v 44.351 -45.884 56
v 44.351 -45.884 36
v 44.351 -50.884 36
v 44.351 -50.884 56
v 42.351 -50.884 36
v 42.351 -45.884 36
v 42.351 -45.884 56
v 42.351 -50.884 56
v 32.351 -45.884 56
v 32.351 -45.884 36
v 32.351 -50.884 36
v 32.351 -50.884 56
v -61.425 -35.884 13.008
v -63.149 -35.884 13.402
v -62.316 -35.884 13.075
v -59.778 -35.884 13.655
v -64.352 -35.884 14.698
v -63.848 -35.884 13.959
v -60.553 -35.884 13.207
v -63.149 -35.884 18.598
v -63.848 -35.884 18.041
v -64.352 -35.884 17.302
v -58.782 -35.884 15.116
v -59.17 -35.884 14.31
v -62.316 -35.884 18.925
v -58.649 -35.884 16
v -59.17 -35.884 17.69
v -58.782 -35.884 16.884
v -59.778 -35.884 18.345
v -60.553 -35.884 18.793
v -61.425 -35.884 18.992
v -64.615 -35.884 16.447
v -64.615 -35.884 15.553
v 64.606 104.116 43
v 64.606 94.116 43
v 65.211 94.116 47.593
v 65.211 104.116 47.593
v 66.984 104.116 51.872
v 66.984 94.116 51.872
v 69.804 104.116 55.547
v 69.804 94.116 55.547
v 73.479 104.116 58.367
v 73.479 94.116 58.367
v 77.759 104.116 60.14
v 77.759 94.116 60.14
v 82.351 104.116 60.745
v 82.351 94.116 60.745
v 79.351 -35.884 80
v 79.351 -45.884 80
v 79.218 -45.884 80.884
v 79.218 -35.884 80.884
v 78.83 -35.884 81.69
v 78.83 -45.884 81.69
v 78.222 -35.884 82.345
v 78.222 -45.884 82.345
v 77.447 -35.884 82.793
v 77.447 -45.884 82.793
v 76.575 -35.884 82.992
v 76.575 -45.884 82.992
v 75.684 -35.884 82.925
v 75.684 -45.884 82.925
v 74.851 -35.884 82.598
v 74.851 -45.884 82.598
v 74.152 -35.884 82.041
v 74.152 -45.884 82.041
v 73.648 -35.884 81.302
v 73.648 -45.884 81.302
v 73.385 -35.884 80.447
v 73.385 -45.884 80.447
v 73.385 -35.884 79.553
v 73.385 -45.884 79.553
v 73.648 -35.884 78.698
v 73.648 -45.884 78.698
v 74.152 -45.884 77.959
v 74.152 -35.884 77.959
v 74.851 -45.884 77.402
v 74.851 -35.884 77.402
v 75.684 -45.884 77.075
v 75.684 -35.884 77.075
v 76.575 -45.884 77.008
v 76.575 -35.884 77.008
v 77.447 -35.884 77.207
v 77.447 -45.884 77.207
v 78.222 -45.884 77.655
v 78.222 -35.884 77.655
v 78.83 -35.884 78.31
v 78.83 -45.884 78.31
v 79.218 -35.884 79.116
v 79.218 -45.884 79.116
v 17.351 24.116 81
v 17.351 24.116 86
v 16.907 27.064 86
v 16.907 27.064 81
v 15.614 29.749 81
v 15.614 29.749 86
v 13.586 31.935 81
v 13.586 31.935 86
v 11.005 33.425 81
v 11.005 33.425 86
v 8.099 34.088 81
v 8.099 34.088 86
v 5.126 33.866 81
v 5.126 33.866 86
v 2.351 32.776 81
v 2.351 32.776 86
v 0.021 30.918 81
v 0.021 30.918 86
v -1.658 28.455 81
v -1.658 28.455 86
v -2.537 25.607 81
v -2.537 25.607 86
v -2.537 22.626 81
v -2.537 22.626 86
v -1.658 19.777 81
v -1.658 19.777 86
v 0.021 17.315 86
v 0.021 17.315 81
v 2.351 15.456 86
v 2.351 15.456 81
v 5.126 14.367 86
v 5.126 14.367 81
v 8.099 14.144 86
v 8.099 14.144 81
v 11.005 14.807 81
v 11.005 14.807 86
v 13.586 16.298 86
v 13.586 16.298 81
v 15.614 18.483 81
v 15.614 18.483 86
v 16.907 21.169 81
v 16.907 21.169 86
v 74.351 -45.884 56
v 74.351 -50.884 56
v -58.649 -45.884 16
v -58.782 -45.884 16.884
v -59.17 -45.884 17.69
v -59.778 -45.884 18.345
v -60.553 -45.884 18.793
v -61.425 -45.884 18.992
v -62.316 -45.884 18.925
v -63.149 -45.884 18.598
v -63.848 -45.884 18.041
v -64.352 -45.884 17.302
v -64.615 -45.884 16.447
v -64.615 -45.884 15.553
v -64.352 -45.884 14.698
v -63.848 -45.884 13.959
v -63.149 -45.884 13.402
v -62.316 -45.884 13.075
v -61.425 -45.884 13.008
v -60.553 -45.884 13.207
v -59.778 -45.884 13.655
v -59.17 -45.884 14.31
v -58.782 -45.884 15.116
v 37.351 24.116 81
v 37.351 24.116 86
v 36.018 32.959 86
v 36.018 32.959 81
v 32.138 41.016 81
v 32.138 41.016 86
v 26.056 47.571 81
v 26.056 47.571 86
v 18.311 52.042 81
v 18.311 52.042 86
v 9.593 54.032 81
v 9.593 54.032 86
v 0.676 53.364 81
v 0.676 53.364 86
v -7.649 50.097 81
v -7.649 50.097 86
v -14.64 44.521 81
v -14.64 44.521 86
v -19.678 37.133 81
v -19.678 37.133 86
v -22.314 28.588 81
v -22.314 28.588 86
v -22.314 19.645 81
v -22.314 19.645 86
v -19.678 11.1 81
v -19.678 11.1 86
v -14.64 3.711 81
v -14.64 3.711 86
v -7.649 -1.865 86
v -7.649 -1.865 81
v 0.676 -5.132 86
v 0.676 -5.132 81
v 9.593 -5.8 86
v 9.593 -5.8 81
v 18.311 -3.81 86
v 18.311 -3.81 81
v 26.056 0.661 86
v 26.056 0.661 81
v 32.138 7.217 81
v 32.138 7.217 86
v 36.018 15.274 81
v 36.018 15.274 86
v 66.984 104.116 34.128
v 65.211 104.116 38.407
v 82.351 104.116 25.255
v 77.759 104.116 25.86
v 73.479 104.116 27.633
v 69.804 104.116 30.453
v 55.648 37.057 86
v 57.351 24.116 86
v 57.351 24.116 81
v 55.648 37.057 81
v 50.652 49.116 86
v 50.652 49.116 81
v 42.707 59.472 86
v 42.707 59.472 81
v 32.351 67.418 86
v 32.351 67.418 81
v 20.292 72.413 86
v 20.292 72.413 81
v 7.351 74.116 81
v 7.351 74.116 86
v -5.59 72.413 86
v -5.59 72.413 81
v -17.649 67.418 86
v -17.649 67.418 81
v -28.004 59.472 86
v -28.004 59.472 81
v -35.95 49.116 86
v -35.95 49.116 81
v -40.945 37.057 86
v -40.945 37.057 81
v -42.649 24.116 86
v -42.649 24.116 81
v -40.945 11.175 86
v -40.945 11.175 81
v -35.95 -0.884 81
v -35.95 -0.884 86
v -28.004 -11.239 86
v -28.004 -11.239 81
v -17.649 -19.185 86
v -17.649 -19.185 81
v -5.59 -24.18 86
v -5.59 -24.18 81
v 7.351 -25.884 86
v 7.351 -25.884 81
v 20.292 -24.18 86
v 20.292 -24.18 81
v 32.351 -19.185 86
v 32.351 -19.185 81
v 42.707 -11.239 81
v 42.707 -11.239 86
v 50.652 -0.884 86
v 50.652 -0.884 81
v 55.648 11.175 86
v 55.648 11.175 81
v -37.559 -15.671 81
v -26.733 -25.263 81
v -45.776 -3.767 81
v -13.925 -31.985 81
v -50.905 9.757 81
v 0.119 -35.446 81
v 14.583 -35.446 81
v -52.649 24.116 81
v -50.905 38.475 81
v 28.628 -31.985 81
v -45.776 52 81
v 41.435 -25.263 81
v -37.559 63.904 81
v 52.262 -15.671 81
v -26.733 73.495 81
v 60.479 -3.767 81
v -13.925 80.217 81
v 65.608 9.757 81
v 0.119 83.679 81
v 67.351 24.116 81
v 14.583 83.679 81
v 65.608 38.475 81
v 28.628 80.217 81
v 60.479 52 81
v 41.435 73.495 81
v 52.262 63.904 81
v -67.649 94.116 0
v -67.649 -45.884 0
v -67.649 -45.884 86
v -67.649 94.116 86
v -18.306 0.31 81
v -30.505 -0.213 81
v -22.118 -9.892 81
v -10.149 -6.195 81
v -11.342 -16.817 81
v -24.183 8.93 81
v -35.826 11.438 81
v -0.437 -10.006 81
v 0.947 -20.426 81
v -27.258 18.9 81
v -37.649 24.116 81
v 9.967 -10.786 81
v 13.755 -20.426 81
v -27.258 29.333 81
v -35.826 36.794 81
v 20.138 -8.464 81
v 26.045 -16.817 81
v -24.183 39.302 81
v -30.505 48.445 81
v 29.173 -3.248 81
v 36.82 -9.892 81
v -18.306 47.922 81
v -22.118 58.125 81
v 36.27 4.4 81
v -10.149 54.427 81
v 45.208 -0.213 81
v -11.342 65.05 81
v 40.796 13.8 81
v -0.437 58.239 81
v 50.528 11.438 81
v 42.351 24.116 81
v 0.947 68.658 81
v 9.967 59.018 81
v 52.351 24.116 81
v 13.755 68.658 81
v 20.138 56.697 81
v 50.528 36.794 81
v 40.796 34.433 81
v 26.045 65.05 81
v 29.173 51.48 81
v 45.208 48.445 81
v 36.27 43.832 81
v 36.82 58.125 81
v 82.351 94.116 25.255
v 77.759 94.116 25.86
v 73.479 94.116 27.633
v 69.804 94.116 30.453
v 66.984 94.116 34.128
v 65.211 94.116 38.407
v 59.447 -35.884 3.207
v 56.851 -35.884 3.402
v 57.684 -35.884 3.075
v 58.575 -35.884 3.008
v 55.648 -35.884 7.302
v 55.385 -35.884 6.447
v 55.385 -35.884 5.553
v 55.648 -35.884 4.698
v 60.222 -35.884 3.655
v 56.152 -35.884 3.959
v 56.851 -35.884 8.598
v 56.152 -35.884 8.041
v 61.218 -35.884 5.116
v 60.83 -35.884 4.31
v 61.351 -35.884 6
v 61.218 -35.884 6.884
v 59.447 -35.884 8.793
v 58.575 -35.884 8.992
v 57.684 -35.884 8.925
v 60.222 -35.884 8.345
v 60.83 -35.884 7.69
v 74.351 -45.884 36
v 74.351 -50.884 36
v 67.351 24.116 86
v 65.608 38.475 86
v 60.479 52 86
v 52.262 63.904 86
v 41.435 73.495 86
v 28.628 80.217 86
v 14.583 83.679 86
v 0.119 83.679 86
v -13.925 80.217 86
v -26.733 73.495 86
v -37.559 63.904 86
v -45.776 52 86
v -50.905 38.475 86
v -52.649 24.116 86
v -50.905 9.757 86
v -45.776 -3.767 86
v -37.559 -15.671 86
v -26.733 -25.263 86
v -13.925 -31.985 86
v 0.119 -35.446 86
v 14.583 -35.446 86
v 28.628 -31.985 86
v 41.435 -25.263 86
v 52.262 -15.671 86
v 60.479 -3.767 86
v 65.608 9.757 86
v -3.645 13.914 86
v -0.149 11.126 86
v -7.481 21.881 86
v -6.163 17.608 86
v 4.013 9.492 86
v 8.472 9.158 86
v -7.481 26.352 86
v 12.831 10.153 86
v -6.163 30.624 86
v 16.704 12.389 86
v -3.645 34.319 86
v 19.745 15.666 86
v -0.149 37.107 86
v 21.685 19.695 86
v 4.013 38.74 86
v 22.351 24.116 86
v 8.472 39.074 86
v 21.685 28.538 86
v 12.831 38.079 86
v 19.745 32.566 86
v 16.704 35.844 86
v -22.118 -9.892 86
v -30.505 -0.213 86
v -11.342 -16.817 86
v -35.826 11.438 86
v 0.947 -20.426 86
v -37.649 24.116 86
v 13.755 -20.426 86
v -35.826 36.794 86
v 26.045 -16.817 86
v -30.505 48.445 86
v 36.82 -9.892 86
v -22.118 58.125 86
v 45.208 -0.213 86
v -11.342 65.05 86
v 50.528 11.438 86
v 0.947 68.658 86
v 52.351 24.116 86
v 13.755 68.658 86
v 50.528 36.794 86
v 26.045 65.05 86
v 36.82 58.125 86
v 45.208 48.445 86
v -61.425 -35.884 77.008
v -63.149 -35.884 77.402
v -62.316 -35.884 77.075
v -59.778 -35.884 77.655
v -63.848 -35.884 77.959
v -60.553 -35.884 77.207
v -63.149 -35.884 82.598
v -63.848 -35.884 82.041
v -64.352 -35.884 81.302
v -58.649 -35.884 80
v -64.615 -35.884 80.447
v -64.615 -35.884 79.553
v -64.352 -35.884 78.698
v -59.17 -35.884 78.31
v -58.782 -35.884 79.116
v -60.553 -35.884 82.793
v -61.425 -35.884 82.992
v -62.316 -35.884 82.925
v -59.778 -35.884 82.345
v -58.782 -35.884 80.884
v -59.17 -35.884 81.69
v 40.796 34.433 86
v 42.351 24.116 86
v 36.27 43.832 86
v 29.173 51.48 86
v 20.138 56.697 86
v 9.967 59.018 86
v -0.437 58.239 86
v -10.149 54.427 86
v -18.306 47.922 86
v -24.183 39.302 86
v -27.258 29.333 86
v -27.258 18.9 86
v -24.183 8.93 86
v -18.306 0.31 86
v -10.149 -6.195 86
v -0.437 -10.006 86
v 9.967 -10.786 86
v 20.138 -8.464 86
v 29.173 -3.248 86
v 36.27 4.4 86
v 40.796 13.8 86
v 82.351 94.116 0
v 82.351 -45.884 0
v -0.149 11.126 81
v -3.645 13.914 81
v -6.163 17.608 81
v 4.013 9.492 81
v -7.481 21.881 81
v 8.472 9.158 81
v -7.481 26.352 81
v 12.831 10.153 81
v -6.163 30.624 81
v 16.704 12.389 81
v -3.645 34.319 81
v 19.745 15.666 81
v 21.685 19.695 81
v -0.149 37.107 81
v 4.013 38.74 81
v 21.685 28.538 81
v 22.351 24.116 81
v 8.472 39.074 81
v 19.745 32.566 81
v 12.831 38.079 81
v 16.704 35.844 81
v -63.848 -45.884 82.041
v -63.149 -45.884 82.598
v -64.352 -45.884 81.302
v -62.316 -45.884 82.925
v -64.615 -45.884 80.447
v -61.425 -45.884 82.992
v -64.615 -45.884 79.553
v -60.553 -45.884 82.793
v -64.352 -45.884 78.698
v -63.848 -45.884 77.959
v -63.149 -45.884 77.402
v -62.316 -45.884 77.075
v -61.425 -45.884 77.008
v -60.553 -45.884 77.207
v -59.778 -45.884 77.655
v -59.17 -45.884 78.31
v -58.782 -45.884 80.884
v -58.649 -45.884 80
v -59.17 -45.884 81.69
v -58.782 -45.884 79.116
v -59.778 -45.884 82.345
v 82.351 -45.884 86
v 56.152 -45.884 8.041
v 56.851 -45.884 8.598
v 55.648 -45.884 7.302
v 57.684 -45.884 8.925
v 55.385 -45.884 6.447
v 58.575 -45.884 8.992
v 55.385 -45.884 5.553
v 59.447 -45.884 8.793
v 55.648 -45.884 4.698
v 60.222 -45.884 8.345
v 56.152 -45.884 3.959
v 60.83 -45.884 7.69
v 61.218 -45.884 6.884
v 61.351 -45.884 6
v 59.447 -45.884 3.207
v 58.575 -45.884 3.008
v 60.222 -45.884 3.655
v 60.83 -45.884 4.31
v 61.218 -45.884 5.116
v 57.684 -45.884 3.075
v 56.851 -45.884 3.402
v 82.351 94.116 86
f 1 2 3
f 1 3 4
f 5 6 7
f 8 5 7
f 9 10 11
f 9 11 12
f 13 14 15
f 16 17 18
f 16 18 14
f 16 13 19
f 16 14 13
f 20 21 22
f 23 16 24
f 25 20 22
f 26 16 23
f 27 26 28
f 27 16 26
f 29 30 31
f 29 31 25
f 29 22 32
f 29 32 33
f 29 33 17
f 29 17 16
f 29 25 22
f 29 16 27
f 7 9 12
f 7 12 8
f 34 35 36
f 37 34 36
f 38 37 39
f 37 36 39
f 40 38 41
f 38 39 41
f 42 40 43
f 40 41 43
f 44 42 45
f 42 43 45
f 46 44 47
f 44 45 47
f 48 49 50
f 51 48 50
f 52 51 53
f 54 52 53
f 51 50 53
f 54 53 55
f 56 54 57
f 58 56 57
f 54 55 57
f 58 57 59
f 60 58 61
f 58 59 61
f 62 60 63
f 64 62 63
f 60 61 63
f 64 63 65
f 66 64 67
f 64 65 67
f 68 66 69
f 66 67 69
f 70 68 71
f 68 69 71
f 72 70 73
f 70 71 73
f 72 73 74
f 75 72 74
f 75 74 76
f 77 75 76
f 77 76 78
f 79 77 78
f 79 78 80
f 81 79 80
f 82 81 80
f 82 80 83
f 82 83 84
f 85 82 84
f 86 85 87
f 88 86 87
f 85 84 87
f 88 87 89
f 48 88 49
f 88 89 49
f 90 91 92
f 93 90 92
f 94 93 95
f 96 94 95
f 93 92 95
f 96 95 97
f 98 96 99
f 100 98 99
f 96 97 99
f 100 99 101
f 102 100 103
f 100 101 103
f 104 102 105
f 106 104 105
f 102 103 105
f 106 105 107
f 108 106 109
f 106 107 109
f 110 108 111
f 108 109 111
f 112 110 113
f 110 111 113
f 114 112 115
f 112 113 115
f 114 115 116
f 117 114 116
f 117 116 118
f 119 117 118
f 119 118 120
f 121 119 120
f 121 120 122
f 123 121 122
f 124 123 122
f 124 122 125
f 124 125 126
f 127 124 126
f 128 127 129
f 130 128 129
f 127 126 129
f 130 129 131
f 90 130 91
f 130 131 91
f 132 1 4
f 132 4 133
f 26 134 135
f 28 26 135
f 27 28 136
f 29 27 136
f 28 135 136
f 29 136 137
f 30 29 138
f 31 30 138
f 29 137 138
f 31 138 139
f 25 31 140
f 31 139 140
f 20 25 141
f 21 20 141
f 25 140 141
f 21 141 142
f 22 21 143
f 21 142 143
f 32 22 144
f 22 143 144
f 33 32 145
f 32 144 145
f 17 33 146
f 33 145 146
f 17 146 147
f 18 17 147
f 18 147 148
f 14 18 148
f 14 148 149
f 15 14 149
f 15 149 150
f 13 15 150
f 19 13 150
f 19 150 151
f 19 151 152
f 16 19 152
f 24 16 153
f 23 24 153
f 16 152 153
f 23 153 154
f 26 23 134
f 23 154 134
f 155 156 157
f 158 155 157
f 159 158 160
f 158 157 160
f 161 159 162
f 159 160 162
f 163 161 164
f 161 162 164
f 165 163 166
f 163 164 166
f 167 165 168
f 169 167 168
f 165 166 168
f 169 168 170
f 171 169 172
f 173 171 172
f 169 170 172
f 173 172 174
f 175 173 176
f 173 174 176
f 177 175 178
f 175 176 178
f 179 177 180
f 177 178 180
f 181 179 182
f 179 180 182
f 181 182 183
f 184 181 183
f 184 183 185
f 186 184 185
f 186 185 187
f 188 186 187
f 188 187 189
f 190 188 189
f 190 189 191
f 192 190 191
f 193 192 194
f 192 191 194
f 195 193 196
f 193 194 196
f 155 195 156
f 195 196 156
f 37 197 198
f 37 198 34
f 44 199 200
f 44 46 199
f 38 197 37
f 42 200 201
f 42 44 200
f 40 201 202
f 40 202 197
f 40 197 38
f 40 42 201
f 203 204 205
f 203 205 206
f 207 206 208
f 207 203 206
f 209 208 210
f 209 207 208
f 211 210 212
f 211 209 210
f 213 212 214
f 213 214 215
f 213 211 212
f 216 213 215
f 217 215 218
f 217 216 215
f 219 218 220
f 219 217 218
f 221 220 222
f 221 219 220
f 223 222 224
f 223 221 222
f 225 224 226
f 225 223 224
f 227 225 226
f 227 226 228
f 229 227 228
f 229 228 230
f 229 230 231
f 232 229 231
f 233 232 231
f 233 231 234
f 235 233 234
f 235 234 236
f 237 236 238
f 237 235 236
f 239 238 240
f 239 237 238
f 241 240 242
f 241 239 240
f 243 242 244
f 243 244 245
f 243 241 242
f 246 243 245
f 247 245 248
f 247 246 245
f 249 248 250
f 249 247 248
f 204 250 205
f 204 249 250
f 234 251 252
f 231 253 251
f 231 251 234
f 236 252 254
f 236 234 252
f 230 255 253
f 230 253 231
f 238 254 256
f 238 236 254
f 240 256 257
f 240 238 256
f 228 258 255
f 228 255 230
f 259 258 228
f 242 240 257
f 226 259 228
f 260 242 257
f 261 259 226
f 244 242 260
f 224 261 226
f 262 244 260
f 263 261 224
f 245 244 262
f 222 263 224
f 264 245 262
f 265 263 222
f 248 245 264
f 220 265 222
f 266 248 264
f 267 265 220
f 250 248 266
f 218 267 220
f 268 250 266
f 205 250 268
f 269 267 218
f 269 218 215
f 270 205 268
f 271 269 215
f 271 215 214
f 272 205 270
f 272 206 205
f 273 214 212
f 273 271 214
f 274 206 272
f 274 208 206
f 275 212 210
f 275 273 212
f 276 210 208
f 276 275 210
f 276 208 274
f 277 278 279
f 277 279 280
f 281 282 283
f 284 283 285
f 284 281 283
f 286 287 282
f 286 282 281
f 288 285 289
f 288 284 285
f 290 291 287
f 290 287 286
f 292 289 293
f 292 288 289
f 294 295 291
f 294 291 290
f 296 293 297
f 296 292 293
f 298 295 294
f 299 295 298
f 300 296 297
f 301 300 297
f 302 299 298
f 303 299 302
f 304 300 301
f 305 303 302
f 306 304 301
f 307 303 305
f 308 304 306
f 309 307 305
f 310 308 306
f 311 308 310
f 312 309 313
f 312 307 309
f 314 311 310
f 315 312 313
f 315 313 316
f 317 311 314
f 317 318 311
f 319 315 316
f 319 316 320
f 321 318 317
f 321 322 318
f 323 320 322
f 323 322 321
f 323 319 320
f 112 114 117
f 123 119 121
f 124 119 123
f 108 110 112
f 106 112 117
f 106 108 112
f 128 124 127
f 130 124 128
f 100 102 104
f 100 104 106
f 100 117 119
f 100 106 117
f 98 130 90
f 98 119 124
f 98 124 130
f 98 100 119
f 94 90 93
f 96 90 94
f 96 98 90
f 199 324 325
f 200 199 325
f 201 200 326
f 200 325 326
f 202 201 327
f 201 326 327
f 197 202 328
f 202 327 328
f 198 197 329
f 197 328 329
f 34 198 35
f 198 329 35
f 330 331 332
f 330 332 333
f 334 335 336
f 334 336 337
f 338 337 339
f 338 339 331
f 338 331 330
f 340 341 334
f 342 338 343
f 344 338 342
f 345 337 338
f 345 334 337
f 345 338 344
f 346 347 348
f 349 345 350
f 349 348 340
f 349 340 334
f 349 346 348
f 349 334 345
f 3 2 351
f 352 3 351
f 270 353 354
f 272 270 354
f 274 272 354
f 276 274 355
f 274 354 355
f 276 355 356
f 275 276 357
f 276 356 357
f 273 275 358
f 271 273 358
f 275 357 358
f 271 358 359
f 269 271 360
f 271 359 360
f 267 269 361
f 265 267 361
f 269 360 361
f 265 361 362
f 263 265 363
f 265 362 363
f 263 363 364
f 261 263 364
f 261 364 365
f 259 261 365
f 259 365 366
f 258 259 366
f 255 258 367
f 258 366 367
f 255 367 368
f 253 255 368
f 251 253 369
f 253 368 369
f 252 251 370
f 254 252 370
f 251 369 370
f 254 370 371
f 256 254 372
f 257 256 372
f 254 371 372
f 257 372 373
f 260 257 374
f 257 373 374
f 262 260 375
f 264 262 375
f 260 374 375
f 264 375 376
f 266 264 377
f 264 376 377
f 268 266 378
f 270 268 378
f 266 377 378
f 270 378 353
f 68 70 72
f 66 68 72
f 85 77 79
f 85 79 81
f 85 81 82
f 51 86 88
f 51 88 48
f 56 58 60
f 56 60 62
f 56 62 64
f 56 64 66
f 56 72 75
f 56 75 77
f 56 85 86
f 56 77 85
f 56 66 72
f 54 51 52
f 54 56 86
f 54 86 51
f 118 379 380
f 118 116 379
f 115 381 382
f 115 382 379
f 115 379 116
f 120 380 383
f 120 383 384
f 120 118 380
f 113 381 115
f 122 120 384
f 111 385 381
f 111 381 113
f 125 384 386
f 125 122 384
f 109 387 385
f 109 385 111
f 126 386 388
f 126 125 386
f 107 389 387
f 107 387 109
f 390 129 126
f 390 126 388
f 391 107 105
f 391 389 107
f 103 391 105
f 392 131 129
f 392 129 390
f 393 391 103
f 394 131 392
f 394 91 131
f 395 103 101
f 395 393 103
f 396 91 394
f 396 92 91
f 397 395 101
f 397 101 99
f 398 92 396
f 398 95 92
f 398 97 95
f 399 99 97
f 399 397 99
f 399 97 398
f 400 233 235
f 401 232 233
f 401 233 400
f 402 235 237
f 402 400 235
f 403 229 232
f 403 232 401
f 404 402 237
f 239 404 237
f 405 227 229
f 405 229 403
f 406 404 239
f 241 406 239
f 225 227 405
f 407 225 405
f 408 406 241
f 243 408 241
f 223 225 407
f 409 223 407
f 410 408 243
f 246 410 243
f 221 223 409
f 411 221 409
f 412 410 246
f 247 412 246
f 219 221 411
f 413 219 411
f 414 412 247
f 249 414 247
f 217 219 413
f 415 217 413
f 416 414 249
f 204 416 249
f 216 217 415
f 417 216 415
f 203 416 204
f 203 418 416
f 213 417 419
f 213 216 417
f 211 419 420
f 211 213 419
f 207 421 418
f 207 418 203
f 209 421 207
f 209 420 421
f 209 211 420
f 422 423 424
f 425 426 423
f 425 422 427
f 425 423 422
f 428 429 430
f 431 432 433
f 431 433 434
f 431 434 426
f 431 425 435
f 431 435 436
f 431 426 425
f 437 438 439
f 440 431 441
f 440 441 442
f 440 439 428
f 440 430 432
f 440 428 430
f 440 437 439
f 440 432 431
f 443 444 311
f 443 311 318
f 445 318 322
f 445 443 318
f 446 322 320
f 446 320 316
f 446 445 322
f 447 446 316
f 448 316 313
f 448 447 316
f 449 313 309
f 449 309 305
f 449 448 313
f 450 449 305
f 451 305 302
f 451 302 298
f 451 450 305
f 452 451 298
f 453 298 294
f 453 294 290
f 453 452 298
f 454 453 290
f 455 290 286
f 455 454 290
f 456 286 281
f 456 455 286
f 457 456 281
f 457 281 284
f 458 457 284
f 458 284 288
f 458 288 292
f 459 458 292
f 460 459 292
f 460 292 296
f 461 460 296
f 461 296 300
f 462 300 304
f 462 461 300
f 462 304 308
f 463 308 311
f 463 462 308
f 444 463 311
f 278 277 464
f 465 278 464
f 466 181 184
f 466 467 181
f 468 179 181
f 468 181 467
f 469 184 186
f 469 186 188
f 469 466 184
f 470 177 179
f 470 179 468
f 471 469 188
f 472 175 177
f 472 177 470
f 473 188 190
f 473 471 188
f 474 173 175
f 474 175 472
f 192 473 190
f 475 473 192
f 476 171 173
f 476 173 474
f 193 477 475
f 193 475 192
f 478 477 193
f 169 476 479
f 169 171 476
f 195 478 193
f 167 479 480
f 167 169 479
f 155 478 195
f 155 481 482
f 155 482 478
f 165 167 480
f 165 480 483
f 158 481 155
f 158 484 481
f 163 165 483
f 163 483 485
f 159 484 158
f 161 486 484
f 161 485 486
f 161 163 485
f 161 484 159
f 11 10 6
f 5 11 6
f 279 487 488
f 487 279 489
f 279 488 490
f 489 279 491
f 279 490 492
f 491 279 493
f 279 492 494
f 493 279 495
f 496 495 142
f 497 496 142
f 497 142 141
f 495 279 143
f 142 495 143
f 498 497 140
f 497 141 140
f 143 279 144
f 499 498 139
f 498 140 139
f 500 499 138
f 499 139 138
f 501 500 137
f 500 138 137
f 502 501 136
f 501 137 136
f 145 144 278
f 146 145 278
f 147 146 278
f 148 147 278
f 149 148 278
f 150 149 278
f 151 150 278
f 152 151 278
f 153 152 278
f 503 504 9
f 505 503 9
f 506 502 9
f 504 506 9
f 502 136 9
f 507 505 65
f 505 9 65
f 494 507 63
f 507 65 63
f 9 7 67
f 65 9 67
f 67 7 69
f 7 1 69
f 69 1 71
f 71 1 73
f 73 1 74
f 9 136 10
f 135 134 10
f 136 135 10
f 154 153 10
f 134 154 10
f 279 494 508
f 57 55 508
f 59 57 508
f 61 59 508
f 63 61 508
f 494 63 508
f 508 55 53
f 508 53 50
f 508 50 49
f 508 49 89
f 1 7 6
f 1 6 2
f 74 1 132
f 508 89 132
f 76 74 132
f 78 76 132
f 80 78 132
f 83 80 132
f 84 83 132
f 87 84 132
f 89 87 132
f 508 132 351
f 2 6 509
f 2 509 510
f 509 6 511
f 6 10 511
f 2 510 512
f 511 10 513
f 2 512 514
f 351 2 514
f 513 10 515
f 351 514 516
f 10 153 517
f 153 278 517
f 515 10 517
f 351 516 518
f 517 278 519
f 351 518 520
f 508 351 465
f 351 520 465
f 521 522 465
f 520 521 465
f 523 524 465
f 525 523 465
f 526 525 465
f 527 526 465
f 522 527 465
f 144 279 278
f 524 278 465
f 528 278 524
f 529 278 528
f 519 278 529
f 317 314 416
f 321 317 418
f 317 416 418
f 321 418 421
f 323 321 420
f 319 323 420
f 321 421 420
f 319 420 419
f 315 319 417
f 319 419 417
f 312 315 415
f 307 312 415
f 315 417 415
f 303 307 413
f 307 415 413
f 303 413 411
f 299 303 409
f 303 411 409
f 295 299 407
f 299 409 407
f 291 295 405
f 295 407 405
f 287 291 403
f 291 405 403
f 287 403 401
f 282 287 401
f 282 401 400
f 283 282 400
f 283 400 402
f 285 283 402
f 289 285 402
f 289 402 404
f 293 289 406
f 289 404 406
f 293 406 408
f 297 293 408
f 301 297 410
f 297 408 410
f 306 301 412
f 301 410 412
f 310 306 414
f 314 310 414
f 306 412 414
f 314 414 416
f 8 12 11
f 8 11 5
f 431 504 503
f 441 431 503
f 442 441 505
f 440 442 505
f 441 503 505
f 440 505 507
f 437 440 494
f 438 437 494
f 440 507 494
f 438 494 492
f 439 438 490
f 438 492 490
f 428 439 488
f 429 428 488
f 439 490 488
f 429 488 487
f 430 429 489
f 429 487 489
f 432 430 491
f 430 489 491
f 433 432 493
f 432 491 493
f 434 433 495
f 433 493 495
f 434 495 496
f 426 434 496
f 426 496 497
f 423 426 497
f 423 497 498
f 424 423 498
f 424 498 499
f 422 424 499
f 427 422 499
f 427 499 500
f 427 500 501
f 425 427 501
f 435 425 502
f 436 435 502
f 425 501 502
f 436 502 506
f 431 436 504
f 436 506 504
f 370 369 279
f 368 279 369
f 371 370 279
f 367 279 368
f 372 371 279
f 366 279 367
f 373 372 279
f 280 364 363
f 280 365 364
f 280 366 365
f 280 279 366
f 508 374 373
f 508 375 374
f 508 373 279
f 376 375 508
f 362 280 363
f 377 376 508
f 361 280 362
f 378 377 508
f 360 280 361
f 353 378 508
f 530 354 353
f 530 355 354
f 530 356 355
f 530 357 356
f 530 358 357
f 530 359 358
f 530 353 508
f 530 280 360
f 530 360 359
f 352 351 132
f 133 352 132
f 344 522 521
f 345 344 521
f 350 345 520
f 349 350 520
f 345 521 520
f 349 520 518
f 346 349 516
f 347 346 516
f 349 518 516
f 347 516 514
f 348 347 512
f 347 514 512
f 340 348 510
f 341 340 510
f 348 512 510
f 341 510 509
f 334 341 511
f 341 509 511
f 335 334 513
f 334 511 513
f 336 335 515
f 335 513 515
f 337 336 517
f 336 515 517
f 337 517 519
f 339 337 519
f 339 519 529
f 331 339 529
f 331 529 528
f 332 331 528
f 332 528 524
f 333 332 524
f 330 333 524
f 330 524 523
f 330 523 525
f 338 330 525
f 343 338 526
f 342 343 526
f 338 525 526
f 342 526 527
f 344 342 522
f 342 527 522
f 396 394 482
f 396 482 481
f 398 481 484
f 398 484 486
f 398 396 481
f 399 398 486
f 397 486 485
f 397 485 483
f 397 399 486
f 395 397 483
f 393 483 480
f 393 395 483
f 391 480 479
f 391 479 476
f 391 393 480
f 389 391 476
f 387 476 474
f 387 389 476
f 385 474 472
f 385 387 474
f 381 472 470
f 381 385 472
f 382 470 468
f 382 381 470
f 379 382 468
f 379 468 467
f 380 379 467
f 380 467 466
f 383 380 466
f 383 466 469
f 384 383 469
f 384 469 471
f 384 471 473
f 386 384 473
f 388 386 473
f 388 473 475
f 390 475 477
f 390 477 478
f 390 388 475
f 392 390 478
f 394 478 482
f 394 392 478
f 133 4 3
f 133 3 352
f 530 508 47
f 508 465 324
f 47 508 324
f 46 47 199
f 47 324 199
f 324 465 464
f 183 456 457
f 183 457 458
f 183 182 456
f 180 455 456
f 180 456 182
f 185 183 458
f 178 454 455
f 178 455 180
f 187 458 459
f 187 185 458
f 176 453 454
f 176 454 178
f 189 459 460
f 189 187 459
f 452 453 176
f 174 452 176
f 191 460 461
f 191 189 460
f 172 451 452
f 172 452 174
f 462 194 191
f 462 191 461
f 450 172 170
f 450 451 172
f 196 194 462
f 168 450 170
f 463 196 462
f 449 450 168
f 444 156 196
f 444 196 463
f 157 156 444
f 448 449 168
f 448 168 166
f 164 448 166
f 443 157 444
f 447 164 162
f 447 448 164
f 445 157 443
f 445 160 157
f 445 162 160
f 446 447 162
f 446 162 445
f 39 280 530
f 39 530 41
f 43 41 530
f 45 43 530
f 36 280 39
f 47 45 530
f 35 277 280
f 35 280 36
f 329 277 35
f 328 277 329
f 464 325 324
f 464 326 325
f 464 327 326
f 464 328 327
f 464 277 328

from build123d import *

# Parameters (mm, degrees)
F0_W     = 150
F0_H     = 140
F1_DEPTH = 86
F2_R     = 3
F3_DEPTH = 10
F2_W     = 30
F2_H     = 20
F2_W_2   = 10
F4_DEPTH = 5
F5_R     = 60
F5_R_2   = 50
F5_R_3   = 45
F5_R_4   = 35
F5_R_5   = 30
F5_R_6   = 15
F5_R_7   = 10
F6_DEPTH = 5
F8_DEPTH = 10


with BuildPart() as f1:
    # F0 (on Top) → F1 (new body)
    with BuildSketch(Plane.XY):
        with Locations((7.351223, 24.116237)):
            Rectangle(F0_W, F0_H)
    extrude(amount=F1_DEPTH)

    # F2 (on face) → F3 (cut)
    with BuildSketch(Plane.XZ.offset(45.883763)):
        with Locations((-61.648777, 80)):
            Circle(F2_R)
        with Locations((-61.648777, 16)):
            Circle(F2_R)
        with Locations((76.351223, 80)):
            Circle(F2_R)
        with Locations((58.351223, 6)):
            Circle(F2_R)
    extrude(amount=-F3_DEPTH, mode=Mode.SUBTRACT)

    # F2 (on face) → F4 (join)
    with BuildSketch(Plane.XZ.offset(45.883763)):
        with Locations((59.351223, 46)):
            Rectangle(F2_W, F2_H)
        with Locations((37.351223, 46)):
            Rectangle(F2_W_2, F2_H)
    extrude(amount=F4_DEPTH)

    # F5 (on face) → F6 (cut)
    with BuildSketch(Plane.XY.offset(86)):
        with Locations((7.351223, 24.116237)):
            Circle(F5_R)
        with Locations((7.351223, 24.116237)):
            Circle(F5_R_2, mode=Mode.SUBTRACT)
        with Locations((7.351223, 24.116237)):
            Circle(F5_R_3)
        with Locations((7.351223, 24.116237)):
            Circle(F5_R_4, mode=Mode.SUBTRACT)
        with Locations((7.351223, 24.116237)):
            Circle(F5_R_5)
        with Locations((7.351223, 24.116237)):
            Circle(F5_R_6, mode=Mode.SUBTRACT)
        with Locations((7.351223, 24.116237)):
            Circle(F5_R_7)
    extrude(amount=-F6_DEPTH, mode=Mode.SUBTRACT)

    # F7 (on face) → F8 (join)
    with BuildSketch(Plane(origin=(0, 94.116237, 0), x_dir=(-1, 0, 0), z_dir=(0, 1, 0))):
        with BuildLine():
            ThreePointArc((-82.351223, 25.255258), (-69.803796, 30.452573), (-64.606481, 43))
            ThreePointArc((-64.606481, 43), (-69.803796, 55.547427), (-82.351223, 60.744742))
            Line((-82.351223, 60.744742), (-82.351223, 25.255258))
        make_face()
    extrude(amount=F8_DEPTH)


solid = f1.part
